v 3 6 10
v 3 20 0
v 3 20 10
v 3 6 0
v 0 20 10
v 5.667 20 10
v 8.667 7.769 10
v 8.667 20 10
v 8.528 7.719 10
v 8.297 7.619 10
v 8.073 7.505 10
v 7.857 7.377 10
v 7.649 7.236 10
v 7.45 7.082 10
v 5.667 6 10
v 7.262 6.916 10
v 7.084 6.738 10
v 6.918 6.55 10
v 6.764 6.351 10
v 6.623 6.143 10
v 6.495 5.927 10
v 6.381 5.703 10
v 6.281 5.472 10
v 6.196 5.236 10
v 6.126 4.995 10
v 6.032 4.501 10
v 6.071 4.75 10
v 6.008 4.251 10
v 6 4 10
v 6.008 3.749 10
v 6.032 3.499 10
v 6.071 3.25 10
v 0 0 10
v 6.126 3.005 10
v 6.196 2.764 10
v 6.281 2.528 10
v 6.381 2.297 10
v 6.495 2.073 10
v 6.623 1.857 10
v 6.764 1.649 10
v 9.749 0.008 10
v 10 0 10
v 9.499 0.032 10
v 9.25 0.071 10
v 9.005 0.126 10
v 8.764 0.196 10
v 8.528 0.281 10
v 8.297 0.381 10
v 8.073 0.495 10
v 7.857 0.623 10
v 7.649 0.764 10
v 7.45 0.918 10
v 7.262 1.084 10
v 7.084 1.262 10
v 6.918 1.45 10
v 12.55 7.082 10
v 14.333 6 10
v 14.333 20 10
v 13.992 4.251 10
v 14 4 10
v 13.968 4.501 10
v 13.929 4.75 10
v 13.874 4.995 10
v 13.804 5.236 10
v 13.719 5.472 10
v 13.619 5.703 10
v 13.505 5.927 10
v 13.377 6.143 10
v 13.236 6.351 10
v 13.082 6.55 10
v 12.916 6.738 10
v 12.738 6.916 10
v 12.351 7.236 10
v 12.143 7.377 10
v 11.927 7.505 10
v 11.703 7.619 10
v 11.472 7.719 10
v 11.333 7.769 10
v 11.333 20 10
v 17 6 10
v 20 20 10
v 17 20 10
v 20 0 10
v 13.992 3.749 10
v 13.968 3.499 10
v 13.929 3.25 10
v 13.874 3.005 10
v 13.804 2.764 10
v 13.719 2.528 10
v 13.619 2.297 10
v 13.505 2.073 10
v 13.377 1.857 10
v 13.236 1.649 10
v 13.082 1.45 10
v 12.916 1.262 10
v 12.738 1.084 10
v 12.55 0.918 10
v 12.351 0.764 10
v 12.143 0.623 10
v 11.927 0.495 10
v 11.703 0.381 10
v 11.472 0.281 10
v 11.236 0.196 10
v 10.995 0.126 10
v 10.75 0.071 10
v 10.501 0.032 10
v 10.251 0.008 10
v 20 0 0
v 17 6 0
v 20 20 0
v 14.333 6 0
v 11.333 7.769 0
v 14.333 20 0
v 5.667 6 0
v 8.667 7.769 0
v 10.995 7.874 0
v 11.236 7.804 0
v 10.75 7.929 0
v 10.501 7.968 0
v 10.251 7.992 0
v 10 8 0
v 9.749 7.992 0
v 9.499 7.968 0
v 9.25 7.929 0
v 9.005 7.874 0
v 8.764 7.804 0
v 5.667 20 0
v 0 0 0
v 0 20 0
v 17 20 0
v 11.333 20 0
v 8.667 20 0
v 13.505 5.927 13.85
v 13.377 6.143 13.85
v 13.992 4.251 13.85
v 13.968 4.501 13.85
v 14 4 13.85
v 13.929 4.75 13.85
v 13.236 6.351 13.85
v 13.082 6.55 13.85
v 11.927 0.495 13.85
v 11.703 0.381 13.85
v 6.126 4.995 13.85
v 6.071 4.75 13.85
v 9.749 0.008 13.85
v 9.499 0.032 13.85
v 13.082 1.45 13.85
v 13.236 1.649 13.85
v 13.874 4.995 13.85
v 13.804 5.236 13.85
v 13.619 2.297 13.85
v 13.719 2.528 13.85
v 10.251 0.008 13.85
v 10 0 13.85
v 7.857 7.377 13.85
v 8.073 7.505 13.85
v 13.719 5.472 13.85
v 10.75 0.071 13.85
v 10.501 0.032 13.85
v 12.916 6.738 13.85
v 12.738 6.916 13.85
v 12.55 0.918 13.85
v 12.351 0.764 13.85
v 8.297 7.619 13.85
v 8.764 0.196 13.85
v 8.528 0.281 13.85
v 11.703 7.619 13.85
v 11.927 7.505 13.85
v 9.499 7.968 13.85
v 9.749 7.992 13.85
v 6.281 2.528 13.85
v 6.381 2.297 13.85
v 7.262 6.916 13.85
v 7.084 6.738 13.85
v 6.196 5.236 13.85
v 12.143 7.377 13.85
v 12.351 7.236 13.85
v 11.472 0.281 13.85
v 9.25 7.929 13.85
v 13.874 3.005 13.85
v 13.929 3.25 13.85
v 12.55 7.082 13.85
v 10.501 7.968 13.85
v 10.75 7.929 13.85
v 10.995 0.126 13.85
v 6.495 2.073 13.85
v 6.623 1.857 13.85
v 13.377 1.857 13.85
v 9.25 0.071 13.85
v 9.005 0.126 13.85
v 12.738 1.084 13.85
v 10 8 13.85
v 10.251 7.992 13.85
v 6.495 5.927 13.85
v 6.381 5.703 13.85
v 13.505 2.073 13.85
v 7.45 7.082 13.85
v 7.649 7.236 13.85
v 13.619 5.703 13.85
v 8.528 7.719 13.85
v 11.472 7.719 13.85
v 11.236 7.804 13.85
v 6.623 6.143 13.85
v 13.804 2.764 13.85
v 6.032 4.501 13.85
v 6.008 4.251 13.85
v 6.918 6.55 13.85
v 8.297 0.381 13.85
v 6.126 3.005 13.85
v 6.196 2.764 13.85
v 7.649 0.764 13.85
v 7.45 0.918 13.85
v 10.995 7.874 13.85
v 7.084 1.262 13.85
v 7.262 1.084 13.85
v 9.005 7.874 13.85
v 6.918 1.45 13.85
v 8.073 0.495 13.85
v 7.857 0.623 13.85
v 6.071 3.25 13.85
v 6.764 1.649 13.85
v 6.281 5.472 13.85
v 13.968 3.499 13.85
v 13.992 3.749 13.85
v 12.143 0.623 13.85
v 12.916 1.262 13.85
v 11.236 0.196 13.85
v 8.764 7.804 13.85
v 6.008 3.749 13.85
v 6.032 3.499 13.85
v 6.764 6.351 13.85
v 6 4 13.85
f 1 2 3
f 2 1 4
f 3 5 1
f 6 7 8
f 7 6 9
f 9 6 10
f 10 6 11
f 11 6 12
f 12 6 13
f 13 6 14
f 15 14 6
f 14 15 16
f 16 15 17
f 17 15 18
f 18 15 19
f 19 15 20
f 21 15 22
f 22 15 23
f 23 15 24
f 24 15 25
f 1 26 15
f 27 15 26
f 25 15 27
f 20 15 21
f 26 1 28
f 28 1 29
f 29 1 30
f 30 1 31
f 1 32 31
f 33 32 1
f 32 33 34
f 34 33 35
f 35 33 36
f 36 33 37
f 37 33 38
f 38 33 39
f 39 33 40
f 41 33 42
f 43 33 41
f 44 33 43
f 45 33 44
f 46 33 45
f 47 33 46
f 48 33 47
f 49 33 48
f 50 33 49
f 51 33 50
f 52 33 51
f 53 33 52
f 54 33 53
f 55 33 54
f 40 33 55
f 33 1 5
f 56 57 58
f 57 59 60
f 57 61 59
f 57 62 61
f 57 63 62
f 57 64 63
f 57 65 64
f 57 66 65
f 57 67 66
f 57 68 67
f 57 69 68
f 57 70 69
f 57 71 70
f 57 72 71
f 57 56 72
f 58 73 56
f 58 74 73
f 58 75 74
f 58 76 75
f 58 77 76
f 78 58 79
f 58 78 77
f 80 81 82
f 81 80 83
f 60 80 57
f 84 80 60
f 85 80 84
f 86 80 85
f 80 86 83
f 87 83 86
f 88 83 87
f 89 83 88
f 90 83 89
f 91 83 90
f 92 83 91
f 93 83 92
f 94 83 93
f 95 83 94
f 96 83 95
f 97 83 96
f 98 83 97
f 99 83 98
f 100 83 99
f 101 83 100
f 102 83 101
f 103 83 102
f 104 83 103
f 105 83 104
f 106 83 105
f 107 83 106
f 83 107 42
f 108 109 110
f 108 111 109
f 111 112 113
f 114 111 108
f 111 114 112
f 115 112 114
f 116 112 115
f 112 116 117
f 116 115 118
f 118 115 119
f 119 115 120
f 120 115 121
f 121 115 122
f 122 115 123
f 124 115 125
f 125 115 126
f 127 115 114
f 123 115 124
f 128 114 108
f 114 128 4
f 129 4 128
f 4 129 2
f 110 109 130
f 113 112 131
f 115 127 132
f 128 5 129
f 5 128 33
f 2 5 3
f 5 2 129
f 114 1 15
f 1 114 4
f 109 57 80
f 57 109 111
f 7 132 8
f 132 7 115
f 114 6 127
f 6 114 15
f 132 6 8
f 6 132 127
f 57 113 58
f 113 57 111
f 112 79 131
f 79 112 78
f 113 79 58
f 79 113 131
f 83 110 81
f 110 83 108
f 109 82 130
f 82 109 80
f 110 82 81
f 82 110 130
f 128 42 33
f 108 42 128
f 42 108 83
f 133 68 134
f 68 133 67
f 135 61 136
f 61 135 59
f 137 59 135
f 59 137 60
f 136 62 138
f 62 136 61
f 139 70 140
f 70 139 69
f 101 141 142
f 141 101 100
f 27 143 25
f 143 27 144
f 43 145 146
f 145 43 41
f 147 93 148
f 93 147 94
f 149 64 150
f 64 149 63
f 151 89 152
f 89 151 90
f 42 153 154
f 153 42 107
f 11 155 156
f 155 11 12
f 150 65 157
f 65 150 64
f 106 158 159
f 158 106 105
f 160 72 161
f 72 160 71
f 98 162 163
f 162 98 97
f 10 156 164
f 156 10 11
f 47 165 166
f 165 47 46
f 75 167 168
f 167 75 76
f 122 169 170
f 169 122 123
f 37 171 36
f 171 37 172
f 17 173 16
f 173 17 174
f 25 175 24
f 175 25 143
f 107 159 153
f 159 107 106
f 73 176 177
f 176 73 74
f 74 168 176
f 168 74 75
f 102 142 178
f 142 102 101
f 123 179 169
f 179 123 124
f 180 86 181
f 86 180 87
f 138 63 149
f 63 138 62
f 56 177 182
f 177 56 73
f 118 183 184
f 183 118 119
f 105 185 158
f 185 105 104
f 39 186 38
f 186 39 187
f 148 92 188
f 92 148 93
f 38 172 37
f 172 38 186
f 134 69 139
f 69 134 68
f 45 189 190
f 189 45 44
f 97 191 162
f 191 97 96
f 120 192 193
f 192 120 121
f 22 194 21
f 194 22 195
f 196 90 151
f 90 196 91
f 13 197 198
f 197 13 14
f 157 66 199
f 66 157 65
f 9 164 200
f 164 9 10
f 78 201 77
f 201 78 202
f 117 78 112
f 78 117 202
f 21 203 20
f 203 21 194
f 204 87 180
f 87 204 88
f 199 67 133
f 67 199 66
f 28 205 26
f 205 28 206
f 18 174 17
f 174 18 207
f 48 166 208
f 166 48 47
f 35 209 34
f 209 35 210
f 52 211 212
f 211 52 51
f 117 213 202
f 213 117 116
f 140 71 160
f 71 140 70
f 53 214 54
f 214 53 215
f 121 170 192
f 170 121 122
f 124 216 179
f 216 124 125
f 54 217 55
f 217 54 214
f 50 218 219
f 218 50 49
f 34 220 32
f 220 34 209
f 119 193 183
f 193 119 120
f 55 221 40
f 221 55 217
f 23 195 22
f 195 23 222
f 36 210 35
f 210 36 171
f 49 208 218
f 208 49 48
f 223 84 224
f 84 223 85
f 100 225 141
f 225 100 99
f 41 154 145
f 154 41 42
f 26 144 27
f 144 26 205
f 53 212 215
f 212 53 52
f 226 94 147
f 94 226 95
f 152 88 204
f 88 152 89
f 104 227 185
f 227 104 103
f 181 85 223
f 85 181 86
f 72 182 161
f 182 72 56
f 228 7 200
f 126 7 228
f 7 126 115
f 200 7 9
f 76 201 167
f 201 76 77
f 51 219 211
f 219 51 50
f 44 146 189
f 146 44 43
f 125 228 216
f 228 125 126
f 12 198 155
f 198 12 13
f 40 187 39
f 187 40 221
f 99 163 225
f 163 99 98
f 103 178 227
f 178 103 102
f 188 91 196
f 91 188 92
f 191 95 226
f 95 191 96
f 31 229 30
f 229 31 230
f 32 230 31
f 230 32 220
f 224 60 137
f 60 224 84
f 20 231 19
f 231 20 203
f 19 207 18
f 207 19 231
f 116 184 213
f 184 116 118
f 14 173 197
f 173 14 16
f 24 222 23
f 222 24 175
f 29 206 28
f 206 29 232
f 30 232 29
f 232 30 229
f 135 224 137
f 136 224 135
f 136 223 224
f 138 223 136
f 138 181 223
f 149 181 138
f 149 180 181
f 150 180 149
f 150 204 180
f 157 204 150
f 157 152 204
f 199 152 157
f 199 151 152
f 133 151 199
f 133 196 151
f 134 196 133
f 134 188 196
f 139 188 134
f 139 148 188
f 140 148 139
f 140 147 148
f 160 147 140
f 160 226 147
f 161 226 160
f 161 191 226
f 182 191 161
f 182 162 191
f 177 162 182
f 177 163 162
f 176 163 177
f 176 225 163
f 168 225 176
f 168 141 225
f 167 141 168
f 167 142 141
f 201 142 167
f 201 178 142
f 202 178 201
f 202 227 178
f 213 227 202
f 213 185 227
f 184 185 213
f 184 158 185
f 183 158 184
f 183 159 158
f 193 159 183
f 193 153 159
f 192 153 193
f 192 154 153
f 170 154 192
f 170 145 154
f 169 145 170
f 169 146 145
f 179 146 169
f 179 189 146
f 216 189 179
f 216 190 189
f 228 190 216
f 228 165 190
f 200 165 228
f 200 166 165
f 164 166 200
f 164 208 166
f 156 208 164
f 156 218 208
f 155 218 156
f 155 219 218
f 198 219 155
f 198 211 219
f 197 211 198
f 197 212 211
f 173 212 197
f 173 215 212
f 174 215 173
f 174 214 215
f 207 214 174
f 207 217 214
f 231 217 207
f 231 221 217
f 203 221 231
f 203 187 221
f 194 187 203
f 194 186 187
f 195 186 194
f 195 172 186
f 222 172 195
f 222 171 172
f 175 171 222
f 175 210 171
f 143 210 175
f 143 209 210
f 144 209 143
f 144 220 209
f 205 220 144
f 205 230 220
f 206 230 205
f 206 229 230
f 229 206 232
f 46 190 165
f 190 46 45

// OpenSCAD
include <lib/dogs.scad>

dog(dogblock, type="small", hole=false);
